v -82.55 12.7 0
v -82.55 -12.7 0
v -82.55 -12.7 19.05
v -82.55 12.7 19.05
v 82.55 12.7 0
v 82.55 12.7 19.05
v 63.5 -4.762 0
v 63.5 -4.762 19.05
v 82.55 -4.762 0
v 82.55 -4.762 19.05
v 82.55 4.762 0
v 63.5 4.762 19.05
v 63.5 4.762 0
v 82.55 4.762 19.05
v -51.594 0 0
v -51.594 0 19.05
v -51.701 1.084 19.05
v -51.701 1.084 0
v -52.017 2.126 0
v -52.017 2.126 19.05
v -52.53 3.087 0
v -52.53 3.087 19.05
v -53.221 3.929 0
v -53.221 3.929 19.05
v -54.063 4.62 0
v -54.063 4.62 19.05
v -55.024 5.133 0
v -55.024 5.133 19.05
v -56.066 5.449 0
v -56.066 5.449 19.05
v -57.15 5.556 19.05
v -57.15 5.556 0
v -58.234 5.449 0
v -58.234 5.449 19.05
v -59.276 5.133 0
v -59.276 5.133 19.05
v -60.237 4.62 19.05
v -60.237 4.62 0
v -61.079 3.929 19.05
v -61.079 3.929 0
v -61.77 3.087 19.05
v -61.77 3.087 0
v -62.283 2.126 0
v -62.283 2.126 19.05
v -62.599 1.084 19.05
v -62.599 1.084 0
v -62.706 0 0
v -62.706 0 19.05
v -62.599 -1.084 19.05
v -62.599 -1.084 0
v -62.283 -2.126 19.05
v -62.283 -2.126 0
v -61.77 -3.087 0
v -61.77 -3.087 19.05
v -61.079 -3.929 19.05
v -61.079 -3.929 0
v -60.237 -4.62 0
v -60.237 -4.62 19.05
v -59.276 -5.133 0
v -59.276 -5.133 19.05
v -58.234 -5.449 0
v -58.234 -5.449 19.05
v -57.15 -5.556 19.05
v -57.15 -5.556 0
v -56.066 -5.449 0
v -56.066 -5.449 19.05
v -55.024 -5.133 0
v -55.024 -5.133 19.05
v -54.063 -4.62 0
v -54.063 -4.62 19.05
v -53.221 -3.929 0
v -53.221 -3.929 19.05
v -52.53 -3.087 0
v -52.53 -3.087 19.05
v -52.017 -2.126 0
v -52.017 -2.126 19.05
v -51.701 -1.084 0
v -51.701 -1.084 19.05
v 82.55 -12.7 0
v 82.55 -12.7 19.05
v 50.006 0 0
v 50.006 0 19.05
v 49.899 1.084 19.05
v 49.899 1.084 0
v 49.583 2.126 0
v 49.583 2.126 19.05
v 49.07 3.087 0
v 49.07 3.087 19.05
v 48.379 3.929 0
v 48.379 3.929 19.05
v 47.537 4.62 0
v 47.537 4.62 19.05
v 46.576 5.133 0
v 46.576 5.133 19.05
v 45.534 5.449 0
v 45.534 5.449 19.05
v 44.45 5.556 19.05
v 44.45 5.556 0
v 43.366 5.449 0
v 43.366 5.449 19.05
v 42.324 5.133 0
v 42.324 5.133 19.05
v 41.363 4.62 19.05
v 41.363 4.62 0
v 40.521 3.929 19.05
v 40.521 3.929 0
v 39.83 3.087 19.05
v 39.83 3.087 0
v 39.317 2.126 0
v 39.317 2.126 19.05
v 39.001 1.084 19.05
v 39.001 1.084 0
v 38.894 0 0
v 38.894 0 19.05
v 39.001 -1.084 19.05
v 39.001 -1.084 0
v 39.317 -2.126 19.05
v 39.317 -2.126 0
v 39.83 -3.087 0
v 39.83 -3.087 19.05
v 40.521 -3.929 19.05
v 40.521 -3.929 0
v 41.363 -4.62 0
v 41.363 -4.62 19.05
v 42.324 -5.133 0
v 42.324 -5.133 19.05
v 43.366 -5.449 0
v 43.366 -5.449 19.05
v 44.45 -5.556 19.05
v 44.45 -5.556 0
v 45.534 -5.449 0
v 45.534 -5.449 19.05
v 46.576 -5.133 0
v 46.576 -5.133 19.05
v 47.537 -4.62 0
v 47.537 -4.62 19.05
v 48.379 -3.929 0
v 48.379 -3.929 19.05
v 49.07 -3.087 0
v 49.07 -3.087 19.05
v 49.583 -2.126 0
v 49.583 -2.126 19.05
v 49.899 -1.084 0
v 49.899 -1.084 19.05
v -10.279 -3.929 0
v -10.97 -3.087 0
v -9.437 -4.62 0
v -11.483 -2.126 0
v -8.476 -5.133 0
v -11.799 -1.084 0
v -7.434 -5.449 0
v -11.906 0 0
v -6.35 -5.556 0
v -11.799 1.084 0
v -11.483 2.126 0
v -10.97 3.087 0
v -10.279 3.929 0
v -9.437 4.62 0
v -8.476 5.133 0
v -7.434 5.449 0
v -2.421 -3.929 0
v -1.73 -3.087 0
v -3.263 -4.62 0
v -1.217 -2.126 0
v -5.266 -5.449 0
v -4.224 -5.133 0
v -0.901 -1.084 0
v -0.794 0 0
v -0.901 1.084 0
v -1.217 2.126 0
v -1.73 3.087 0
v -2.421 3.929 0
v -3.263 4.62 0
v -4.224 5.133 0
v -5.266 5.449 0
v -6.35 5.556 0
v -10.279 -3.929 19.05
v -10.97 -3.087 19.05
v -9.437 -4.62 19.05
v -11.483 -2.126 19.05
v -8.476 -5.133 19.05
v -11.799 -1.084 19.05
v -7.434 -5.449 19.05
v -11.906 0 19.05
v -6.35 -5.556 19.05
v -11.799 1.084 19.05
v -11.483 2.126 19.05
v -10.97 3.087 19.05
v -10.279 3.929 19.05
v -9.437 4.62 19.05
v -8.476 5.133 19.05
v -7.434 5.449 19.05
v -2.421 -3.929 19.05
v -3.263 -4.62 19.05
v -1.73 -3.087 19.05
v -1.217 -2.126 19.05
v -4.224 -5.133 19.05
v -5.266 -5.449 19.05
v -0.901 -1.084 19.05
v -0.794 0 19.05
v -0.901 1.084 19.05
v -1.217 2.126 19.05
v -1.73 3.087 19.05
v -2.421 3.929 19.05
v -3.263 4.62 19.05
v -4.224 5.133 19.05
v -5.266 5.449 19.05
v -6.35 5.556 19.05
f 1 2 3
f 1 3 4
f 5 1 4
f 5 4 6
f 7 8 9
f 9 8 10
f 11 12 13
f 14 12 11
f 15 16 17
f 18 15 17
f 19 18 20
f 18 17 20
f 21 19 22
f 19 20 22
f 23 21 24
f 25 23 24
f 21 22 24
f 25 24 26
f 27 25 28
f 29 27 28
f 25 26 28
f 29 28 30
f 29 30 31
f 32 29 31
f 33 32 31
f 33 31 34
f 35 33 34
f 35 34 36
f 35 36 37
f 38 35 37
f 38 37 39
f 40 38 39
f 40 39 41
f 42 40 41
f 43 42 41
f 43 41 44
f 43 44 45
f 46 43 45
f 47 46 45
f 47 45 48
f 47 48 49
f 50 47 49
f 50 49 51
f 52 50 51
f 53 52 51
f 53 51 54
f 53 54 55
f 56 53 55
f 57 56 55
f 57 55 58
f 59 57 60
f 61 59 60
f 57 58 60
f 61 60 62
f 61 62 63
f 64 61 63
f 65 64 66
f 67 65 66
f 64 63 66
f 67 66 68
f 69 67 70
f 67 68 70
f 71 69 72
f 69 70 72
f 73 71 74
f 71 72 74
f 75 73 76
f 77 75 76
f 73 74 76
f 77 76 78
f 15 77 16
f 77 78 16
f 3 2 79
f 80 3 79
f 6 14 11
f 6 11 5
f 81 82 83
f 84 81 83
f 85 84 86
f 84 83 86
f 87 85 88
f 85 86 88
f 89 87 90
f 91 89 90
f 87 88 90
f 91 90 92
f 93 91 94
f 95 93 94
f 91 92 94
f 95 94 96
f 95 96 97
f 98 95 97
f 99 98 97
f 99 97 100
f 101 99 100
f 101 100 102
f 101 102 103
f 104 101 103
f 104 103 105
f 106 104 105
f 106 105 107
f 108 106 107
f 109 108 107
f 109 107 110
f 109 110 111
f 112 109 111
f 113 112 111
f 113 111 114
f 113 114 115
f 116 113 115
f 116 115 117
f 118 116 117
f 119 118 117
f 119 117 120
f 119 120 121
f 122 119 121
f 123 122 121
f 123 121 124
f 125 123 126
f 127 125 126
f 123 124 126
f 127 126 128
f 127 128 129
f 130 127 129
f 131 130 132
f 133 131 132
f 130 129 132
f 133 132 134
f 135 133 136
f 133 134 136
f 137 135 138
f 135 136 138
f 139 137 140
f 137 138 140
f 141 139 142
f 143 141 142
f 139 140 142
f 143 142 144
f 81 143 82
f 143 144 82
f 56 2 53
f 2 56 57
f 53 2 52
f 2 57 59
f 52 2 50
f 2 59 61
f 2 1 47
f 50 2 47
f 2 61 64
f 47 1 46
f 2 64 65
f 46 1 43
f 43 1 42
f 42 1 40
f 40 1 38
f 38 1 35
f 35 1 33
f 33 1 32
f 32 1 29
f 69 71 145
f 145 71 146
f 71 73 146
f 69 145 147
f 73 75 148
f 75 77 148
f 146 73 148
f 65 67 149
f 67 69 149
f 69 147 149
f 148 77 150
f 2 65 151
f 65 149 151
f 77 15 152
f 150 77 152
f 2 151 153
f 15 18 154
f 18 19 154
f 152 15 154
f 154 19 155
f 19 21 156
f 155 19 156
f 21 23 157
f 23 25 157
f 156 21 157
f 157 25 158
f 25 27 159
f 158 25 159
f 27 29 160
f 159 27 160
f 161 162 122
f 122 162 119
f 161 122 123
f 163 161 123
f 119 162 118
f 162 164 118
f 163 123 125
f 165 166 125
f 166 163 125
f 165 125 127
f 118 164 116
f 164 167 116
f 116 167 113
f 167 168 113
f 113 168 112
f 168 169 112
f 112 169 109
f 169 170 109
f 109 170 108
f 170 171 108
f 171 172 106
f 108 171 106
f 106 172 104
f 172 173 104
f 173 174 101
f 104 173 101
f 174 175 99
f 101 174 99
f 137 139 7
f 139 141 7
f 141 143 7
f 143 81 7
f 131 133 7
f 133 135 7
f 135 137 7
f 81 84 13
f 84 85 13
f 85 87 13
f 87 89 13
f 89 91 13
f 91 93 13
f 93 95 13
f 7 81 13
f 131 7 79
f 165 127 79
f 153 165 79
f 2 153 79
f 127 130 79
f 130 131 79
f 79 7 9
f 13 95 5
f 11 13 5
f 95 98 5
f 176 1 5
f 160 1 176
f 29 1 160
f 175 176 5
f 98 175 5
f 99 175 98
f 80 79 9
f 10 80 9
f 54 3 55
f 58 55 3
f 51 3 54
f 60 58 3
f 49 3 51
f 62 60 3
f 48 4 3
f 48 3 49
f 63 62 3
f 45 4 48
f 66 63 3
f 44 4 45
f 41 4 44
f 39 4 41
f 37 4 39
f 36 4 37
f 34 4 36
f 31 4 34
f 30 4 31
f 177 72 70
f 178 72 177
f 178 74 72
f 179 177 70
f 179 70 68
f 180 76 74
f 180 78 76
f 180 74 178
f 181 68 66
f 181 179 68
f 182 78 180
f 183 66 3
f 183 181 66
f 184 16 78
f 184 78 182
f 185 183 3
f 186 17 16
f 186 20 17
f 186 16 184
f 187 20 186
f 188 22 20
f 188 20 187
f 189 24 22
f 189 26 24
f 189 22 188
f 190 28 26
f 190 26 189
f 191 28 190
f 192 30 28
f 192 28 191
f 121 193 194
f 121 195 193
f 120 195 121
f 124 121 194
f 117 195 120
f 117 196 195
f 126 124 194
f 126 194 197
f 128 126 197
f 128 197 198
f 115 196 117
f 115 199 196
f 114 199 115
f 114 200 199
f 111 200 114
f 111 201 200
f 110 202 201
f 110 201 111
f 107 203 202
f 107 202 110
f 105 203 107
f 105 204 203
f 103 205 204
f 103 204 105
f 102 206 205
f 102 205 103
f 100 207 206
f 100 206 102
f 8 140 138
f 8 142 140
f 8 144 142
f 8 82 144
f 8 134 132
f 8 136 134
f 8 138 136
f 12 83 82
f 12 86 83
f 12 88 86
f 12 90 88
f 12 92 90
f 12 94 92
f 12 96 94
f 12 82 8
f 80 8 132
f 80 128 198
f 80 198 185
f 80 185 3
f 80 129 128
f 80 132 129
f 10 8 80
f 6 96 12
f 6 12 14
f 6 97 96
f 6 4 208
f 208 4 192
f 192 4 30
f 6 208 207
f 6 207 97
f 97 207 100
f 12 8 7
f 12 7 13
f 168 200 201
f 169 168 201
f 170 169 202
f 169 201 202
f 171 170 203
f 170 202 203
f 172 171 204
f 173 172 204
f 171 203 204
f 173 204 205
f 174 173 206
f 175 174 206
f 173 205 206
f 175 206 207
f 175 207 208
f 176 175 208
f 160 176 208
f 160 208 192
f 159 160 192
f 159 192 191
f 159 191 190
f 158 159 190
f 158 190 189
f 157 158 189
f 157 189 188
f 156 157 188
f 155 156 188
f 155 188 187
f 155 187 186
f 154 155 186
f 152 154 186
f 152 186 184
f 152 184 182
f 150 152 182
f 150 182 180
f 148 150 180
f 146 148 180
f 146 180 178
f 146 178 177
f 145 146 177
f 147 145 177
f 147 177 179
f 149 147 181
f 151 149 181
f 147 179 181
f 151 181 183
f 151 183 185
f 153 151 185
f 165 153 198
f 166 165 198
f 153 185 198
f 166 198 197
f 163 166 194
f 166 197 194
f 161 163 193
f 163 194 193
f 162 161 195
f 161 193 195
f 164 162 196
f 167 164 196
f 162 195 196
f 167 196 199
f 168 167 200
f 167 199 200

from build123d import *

# Parameters (mm, degrees)
F0_W     = 165.1
F0_H     = 25.4
F1_DEPTH = 19.05
F2_W     = 19.05
F2_H     = 9.525
F3_DEPTH = 19.051
F4_R     = 5.55625
F5_DEPTH = 19.051


with BuildPart() as f1:
    # F0 (on Top) → F1 (new body)
    with BuildSketch(Plane.XY):
        Rectangle(F0_W, F0_H)
    extrude(amount=F1_DEPTH)

    # F2 (on face) → F3 (cut, through all)
    with BuildSketch(Plane.XY.offset(19.05)):
        with Locations((73.025, 0)):
            Rectangle(F2_W, F2_H)
    extrude(amount=-F3_DEPTH, mode=Mode.SUBTRACT)

    # F4 (on face) → F5 (cut, through all)
    with BuildSketch(Plane.XY.offset(19.05)):
        with Locations((-57.15, 0)):
            Circle(F4_R)
        with Locations((-6.35, 0)):
            Circle(F4_R)
        with Locations((44.45, 0)):
            Circle(F4_R)
    extrude(amount=-F5_DEPTH, mode=Mode.SUBTRACT)


solid = f1.part
